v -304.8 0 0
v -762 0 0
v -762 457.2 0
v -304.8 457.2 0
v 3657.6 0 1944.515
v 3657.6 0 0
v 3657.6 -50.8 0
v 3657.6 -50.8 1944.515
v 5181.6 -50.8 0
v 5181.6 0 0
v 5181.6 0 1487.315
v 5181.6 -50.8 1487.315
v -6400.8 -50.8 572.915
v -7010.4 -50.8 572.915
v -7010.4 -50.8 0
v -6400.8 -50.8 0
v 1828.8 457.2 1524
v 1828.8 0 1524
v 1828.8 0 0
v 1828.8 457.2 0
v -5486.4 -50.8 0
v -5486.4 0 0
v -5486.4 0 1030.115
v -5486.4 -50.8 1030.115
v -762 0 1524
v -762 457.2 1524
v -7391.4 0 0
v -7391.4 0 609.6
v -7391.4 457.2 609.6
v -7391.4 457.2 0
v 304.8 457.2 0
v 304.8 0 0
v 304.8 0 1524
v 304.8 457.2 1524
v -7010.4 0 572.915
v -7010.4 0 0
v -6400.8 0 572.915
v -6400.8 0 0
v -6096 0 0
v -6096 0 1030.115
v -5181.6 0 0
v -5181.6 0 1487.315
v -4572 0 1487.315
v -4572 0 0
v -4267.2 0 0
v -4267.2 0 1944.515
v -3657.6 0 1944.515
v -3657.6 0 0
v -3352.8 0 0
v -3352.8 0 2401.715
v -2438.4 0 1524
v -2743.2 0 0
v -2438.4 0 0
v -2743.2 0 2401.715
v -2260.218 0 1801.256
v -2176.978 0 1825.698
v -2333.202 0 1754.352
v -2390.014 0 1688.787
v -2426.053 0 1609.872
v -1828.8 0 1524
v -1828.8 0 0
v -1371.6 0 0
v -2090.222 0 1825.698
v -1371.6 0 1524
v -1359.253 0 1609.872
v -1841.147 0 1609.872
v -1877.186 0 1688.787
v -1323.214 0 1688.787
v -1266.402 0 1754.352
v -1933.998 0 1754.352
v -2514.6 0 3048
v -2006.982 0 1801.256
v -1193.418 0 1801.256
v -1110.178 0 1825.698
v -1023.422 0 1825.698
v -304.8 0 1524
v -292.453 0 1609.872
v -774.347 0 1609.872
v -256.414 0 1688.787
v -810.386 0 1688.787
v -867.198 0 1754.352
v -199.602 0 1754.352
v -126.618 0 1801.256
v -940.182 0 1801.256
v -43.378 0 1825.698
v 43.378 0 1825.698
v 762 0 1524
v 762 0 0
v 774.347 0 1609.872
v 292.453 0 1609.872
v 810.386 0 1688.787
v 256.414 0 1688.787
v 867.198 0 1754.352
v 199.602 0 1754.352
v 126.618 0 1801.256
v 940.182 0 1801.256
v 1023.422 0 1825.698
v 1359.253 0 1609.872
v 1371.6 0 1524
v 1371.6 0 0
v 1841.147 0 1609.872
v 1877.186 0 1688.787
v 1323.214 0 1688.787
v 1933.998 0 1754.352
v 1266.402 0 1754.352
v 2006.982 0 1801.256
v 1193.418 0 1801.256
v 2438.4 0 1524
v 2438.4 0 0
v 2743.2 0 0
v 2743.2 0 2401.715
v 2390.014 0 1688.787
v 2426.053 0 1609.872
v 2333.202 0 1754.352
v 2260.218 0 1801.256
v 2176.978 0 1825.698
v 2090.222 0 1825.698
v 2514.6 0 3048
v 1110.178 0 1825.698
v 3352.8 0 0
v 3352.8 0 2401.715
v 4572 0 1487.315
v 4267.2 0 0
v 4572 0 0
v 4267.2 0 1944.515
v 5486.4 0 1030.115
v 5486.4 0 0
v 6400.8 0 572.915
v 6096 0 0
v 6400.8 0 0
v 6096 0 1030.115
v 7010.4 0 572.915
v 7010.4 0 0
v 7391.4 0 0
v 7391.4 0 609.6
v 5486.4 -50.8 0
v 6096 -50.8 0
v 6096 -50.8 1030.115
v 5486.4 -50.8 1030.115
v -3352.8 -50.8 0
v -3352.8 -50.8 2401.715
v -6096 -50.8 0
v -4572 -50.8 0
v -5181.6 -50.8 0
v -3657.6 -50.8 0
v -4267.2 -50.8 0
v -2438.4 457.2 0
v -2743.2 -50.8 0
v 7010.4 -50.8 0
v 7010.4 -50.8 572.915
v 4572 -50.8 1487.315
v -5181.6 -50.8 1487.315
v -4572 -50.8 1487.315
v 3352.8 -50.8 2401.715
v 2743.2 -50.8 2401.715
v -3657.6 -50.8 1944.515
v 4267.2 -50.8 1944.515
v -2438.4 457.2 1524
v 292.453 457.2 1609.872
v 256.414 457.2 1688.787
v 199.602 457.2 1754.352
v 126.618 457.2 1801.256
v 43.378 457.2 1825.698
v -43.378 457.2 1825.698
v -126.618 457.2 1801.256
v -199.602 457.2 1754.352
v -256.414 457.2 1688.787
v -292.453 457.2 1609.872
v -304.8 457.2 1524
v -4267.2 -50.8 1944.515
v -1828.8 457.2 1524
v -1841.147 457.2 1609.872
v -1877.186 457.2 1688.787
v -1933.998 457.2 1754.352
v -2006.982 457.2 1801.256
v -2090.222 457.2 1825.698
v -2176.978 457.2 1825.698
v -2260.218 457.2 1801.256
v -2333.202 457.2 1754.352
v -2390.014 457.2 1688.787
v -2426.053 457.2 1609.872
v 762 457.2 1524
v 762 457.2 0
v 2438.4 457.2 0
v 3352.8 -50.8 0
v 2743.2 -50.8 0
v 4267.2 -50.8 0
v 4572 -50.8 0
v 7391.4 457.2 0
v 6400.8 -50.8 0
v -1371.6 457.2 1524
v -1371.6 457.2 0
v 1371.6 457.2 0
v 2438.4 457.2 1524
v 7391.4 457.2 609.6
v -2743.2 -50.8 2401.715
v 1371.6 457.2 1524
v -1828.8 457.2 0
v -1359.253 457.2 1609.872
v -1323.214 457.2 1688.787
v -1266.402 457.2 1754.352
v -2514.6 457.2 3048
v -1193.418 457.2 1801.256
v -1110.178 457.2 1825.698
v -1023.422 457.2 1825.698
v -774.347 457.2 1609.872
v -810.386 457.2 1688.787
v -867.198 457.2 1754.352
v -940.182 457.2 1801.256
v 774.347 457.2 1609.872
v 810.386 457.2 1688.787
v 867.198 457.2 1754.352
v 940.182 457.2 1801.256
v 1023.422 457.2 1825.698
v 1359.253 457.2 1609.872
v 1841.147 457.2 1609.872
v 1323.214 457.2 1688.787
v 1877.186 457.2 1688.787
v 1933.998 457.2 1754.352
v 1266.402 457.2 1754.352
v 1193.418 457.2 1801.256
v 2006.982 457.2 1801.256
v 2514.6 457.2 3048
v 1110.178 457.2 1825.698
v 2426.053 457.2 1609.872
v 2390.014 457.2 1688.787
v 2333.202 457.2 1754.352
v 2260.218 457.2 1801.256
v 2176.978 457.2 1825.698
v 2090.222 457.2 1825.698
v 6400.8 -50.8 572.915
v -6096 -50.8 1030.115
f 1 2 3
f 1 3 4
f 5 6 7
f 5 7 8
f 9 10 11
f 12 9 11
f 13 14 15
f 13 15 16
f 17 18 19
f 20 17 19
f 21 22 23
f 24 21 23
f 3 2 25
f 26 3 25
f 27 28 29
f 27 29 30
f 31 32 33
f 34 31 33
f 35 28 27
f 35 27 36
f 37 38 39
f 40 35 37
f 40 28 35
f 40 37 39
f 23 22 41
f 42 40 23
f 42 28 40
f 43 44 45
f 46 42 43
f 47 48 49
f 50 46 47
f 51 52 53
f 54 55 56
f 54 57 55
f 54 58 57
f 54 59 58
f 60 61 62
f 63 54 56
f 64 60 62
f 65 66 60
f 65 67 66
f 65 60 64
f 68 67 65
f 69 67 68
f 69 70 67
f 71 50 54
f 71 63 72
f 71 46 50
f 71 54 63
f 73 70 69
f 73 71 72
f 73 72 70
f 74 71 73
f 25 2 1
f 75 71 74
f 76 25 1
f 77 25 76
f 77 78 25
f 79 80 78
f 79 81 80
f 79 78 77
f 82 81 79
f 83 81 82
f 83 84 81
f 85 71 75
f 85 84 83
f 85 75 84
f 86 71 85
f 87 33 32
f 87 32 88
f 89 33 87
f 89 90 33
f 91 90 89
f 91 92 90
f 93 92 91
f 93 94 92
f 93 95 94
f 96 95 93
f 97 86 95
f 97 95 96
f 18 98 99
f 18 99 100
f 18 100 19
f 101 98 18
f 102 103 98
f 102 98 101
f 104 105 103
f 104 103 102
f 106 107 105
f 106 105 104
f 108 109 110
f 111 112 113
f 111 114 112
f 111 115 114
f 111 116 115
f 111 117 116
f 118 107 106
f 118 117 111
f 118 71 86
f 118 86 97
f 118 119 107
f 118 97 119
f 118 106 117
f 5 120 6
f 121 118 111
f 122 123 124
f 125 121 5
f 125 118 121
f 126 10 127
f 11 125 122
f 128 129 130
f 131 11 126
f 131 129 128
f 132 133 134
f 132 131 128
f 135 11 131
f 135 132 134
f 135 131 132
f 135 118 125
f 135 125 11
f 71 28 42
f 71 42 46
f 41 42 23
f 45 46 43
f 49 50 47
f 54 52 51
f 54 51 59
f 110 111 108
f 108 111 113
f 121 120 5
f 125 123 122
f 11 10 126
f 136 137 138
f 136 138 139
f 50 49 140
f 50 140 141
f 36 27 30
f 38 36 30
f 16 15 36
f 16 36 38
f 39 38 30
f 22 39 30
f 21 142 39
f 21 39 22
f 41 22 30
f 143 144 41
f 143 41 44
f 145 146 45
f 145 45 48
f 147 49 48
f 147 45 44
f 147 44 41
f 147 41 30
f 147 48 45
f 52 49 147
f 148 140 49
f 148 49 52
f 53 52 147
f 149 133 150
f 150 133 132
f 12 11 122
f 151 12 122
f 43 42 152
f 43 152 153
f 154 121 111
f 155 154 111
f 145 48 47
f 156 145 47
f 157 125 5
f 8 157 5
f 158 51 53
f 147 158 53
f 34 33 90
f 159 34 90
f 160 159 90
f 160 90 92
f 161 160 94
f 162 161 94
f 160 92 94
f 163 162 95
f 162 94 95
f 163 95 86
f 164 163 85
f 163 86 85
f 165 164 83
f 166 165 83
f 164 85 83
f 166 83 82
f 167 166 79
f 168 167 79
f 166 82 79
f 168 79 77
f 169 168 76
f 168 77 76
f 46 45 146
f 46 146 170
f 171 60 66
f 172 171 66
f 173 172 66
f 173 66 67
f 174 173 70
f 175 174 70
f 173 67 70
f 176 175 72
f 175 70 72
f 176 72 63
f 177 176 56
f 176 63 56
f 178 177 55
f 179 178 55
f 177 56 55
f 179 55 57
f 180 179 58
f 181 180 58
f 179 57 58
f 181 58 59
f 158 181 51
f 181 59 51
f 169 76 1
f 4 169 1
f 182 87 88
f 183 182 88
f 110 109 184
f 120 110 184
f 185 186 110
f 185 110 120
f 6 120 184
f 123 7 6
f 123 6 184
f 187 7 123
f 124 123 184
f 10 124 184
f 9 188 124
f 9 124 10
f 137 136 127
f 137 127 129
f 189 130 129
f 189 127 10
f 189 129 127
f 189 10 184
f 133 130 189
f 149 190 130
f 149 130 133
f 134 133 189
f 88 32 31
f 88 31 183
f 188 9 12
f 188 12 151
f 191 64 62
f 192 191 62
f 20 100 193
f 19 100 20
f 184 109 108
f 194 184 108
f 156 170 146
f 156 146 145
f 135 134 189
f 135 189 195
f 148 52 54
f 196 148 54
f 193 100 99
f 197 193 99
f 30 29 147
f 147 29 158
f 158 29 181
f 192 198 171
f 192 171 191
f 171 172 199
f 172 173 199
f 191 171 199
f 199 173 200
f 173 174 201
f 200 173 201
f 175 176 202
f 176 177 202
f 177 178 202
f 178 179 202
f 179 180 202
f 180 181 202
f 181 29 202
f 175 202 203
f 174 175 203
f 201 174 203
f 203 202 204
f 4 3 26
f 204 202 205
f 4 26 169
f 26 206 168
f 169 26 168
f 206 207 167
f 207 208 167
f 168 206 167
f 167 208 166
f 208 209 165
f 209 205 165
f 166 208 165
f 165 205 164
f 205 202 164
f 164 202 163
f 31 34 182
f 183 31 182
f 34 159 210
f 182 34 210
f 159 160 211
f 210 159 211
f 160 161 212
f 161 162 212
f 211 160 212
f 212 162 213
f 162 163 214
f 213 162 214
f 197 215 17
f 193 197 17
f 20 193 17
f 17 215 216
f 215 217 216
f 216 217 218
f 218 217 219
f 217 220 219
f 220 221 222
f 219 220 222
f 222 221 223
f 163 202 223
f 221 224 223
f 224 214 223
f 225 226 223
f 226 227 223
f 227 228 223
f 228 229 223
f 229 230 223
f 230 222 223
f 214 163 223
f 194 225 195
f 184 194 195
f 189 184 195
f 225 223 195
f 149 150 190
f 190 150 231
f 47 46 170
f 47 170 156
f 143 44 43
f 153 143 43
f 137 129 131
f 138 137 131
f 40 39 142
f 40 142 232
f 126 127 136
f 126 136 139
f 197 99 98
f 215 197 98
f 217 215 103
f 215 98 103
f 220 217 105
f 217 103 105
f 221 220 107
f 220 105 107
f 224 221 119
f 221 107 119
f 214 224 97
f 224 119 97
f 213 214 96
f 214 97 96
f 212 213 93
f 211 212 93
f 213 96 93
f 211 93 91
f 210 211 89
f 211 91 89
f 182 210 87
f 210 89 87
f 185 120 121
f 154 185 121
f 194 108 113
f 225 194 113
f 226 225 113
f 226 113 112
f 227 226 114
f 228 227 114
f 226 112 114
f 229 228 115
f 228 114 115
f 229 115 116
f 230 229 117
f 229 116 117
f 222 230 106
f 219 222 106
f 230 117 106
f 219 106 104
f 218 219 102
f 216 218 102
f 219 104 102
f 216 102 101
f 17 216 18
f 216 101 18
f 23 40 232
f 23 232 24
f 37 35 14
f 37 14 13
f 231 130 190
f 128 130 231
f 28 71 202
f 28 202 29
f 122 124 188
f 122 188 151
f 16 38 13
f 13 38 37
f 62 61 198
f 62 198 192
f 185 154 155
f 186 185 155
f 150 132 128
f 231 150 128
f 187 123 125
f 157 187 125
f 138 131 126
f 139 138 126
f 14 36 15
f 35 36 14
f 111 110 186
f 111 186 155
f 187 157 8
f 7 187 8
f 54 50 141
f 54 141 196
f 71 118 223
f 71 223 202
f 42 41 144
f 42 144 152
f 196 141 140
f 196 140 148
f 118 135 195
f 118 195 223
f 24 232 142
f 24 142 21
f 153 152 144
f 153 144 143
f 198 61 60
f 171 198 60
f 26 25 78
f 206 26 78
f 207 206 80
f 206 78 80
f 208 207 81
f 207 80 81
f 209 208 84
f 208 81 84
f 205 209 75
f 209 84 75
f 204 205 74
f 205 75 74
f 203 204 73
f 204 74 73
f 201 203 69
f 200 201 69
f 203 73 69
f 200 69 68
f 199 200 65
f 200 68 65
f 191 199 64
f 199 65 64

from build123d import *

# Parameters (mm, degrees)
F1_W     = 609.6
F1_H     = 1030.115493486
F2_DEPTH = 50.8
F1_H_2   = 2401.715493486
F1_H_3   = 1944.515493486
F1_H_4   = 1487.315493486
F1_H_5   = 572.915493486
F3_DEPTH = 457.2
F6_DEPTH = 457.201


with BuildPart() as f2:
    # F1 (on face) → F2 (new body)
    with BuildSketch(Plane.XZ):
        with Locations((-5791.2, 515.057746743)):
            Rectangle(F1_W, F1_H)
    extrude(amount=F2_DEPTH)



with BuildPart() as f2b:
    # F1 (on face) → F2, piece 2 (new body)
    with BuildSketch(Plane.XZ):
        with Locations((-3048, 1200.857746743)):
            Rectangle(F1_W, F1_H_2)
    extrude(amount=F2_DEPTH)


with BuildPart() as f2c:
    # F1 (on face) → F2, piece 3 (new body)
    with BuildSketch(Plane.XZ):
        with Locations((-3962.4, 972.257746743)):
            Rectangle(F1_W, F1_H_3)
    extrude(amount=F2_DEPTH)


with BuildPart() as f2d:
    # F1 (on face) → F2, piece 4 (new body)
    with BuildSketch(Plane.XZ):
        with Locations((-4876.8, 743.657746743)):
            Rectangle(F1_W, F1_H_4)
    extrude(amount=F2_DEPTH)


with BuildPart() as f2e:
    # F1 (on face) → F2, piece 5 (new body)
    with BuildSketch(Plane.XZ):
        with Locations((-6705.6, 286.457746743)):
            Rectangle(F1_W, F1_H_5)
    extrude(amount=F2_DEPTH)


with BuildPart() as f2_1:
    add(f2.part)

    add(f2b.part)  # F3 merges F2b

    add(f2c.part)  # F3 merges F2c

    add(f2d.part)  # F3 merges F2d

    add(f2e.part)  # F3 merges F2e
    # F0 (on Front) → F3 (join)
    with BuildSketch(Plane.XZ):
        Polygon((-7391.4, 609.6), (-7391.4, 0), (7391.4, 0), (7391.4, 609.6), (2514.6, 3048), (-2514.6, 3048), align=None)
    extrude(amount=-F3_DEPTH)

    # F4: F2 across plane


with BuildPart() as f2_2:
    add(f2_1.part)
    add(f2_1.part.mirror(Plane.YZ))

    # F5 (on face) → F6 (cut, through all)
    with BuildSketch(Plane.XZ):
        with BuildLine():
            Line((-2438.4, 1524), (-2438.4, 0))
            Line((-2438.4, 0), (-1828.8, 0))
            Line((-1828.8, 0), (-1828.8, 1524))
            ThreePointArc((-1828.8, 1524), (-2133.6, 1828.8), (-2438.4, 1524))
        make_face()
        with BuildLine():
            Line((-1371.6, 1524), (-1371.6, 0))
            Line((-1371.6, 0), (-762, 0))
            Line((-762, 0), (-762, 1524))
            ThreePointArc((-762, 1524), (-1066.8, 1828.8), (-1371.6, 1524))
        make_face()
        with BuildLine():
            Line((-304.8, 1524), (-304.8, 0))
            Line((-304.8, 0), (304.8, 0))
            Line((304.8, 0), (304.8, 1524))
            ThreePointArc((304.8, 1524), (0, 1828.8), (-304.8, 1524))
        make_face()
        with BuildLine():
            Line((762, 1524), (762, 0))
            Line((762, 0), (1371.6, 0))
            Line((1371.6, 0), (1371.6, 1524))
            ThreePointArc((1371.6, 1524), (1066.8, 1828.8), (762, 1524))
        make_face()
        with BuildLine():
            Line((1828.8, 1524), (1828.8, 0))
            Line((1828.8, 0), (2438.4, 0))
            Line((2438.4, 0), (2438.4, 1524))
            ThreePointArc((2438.4, 1524), (2133.6, 1828.8), (1828.8, 1524))
        make_face()
    extrude(amount=-F6_DEPTH, mode=Mode.SUBTRACT)


solid = f2_2.part
